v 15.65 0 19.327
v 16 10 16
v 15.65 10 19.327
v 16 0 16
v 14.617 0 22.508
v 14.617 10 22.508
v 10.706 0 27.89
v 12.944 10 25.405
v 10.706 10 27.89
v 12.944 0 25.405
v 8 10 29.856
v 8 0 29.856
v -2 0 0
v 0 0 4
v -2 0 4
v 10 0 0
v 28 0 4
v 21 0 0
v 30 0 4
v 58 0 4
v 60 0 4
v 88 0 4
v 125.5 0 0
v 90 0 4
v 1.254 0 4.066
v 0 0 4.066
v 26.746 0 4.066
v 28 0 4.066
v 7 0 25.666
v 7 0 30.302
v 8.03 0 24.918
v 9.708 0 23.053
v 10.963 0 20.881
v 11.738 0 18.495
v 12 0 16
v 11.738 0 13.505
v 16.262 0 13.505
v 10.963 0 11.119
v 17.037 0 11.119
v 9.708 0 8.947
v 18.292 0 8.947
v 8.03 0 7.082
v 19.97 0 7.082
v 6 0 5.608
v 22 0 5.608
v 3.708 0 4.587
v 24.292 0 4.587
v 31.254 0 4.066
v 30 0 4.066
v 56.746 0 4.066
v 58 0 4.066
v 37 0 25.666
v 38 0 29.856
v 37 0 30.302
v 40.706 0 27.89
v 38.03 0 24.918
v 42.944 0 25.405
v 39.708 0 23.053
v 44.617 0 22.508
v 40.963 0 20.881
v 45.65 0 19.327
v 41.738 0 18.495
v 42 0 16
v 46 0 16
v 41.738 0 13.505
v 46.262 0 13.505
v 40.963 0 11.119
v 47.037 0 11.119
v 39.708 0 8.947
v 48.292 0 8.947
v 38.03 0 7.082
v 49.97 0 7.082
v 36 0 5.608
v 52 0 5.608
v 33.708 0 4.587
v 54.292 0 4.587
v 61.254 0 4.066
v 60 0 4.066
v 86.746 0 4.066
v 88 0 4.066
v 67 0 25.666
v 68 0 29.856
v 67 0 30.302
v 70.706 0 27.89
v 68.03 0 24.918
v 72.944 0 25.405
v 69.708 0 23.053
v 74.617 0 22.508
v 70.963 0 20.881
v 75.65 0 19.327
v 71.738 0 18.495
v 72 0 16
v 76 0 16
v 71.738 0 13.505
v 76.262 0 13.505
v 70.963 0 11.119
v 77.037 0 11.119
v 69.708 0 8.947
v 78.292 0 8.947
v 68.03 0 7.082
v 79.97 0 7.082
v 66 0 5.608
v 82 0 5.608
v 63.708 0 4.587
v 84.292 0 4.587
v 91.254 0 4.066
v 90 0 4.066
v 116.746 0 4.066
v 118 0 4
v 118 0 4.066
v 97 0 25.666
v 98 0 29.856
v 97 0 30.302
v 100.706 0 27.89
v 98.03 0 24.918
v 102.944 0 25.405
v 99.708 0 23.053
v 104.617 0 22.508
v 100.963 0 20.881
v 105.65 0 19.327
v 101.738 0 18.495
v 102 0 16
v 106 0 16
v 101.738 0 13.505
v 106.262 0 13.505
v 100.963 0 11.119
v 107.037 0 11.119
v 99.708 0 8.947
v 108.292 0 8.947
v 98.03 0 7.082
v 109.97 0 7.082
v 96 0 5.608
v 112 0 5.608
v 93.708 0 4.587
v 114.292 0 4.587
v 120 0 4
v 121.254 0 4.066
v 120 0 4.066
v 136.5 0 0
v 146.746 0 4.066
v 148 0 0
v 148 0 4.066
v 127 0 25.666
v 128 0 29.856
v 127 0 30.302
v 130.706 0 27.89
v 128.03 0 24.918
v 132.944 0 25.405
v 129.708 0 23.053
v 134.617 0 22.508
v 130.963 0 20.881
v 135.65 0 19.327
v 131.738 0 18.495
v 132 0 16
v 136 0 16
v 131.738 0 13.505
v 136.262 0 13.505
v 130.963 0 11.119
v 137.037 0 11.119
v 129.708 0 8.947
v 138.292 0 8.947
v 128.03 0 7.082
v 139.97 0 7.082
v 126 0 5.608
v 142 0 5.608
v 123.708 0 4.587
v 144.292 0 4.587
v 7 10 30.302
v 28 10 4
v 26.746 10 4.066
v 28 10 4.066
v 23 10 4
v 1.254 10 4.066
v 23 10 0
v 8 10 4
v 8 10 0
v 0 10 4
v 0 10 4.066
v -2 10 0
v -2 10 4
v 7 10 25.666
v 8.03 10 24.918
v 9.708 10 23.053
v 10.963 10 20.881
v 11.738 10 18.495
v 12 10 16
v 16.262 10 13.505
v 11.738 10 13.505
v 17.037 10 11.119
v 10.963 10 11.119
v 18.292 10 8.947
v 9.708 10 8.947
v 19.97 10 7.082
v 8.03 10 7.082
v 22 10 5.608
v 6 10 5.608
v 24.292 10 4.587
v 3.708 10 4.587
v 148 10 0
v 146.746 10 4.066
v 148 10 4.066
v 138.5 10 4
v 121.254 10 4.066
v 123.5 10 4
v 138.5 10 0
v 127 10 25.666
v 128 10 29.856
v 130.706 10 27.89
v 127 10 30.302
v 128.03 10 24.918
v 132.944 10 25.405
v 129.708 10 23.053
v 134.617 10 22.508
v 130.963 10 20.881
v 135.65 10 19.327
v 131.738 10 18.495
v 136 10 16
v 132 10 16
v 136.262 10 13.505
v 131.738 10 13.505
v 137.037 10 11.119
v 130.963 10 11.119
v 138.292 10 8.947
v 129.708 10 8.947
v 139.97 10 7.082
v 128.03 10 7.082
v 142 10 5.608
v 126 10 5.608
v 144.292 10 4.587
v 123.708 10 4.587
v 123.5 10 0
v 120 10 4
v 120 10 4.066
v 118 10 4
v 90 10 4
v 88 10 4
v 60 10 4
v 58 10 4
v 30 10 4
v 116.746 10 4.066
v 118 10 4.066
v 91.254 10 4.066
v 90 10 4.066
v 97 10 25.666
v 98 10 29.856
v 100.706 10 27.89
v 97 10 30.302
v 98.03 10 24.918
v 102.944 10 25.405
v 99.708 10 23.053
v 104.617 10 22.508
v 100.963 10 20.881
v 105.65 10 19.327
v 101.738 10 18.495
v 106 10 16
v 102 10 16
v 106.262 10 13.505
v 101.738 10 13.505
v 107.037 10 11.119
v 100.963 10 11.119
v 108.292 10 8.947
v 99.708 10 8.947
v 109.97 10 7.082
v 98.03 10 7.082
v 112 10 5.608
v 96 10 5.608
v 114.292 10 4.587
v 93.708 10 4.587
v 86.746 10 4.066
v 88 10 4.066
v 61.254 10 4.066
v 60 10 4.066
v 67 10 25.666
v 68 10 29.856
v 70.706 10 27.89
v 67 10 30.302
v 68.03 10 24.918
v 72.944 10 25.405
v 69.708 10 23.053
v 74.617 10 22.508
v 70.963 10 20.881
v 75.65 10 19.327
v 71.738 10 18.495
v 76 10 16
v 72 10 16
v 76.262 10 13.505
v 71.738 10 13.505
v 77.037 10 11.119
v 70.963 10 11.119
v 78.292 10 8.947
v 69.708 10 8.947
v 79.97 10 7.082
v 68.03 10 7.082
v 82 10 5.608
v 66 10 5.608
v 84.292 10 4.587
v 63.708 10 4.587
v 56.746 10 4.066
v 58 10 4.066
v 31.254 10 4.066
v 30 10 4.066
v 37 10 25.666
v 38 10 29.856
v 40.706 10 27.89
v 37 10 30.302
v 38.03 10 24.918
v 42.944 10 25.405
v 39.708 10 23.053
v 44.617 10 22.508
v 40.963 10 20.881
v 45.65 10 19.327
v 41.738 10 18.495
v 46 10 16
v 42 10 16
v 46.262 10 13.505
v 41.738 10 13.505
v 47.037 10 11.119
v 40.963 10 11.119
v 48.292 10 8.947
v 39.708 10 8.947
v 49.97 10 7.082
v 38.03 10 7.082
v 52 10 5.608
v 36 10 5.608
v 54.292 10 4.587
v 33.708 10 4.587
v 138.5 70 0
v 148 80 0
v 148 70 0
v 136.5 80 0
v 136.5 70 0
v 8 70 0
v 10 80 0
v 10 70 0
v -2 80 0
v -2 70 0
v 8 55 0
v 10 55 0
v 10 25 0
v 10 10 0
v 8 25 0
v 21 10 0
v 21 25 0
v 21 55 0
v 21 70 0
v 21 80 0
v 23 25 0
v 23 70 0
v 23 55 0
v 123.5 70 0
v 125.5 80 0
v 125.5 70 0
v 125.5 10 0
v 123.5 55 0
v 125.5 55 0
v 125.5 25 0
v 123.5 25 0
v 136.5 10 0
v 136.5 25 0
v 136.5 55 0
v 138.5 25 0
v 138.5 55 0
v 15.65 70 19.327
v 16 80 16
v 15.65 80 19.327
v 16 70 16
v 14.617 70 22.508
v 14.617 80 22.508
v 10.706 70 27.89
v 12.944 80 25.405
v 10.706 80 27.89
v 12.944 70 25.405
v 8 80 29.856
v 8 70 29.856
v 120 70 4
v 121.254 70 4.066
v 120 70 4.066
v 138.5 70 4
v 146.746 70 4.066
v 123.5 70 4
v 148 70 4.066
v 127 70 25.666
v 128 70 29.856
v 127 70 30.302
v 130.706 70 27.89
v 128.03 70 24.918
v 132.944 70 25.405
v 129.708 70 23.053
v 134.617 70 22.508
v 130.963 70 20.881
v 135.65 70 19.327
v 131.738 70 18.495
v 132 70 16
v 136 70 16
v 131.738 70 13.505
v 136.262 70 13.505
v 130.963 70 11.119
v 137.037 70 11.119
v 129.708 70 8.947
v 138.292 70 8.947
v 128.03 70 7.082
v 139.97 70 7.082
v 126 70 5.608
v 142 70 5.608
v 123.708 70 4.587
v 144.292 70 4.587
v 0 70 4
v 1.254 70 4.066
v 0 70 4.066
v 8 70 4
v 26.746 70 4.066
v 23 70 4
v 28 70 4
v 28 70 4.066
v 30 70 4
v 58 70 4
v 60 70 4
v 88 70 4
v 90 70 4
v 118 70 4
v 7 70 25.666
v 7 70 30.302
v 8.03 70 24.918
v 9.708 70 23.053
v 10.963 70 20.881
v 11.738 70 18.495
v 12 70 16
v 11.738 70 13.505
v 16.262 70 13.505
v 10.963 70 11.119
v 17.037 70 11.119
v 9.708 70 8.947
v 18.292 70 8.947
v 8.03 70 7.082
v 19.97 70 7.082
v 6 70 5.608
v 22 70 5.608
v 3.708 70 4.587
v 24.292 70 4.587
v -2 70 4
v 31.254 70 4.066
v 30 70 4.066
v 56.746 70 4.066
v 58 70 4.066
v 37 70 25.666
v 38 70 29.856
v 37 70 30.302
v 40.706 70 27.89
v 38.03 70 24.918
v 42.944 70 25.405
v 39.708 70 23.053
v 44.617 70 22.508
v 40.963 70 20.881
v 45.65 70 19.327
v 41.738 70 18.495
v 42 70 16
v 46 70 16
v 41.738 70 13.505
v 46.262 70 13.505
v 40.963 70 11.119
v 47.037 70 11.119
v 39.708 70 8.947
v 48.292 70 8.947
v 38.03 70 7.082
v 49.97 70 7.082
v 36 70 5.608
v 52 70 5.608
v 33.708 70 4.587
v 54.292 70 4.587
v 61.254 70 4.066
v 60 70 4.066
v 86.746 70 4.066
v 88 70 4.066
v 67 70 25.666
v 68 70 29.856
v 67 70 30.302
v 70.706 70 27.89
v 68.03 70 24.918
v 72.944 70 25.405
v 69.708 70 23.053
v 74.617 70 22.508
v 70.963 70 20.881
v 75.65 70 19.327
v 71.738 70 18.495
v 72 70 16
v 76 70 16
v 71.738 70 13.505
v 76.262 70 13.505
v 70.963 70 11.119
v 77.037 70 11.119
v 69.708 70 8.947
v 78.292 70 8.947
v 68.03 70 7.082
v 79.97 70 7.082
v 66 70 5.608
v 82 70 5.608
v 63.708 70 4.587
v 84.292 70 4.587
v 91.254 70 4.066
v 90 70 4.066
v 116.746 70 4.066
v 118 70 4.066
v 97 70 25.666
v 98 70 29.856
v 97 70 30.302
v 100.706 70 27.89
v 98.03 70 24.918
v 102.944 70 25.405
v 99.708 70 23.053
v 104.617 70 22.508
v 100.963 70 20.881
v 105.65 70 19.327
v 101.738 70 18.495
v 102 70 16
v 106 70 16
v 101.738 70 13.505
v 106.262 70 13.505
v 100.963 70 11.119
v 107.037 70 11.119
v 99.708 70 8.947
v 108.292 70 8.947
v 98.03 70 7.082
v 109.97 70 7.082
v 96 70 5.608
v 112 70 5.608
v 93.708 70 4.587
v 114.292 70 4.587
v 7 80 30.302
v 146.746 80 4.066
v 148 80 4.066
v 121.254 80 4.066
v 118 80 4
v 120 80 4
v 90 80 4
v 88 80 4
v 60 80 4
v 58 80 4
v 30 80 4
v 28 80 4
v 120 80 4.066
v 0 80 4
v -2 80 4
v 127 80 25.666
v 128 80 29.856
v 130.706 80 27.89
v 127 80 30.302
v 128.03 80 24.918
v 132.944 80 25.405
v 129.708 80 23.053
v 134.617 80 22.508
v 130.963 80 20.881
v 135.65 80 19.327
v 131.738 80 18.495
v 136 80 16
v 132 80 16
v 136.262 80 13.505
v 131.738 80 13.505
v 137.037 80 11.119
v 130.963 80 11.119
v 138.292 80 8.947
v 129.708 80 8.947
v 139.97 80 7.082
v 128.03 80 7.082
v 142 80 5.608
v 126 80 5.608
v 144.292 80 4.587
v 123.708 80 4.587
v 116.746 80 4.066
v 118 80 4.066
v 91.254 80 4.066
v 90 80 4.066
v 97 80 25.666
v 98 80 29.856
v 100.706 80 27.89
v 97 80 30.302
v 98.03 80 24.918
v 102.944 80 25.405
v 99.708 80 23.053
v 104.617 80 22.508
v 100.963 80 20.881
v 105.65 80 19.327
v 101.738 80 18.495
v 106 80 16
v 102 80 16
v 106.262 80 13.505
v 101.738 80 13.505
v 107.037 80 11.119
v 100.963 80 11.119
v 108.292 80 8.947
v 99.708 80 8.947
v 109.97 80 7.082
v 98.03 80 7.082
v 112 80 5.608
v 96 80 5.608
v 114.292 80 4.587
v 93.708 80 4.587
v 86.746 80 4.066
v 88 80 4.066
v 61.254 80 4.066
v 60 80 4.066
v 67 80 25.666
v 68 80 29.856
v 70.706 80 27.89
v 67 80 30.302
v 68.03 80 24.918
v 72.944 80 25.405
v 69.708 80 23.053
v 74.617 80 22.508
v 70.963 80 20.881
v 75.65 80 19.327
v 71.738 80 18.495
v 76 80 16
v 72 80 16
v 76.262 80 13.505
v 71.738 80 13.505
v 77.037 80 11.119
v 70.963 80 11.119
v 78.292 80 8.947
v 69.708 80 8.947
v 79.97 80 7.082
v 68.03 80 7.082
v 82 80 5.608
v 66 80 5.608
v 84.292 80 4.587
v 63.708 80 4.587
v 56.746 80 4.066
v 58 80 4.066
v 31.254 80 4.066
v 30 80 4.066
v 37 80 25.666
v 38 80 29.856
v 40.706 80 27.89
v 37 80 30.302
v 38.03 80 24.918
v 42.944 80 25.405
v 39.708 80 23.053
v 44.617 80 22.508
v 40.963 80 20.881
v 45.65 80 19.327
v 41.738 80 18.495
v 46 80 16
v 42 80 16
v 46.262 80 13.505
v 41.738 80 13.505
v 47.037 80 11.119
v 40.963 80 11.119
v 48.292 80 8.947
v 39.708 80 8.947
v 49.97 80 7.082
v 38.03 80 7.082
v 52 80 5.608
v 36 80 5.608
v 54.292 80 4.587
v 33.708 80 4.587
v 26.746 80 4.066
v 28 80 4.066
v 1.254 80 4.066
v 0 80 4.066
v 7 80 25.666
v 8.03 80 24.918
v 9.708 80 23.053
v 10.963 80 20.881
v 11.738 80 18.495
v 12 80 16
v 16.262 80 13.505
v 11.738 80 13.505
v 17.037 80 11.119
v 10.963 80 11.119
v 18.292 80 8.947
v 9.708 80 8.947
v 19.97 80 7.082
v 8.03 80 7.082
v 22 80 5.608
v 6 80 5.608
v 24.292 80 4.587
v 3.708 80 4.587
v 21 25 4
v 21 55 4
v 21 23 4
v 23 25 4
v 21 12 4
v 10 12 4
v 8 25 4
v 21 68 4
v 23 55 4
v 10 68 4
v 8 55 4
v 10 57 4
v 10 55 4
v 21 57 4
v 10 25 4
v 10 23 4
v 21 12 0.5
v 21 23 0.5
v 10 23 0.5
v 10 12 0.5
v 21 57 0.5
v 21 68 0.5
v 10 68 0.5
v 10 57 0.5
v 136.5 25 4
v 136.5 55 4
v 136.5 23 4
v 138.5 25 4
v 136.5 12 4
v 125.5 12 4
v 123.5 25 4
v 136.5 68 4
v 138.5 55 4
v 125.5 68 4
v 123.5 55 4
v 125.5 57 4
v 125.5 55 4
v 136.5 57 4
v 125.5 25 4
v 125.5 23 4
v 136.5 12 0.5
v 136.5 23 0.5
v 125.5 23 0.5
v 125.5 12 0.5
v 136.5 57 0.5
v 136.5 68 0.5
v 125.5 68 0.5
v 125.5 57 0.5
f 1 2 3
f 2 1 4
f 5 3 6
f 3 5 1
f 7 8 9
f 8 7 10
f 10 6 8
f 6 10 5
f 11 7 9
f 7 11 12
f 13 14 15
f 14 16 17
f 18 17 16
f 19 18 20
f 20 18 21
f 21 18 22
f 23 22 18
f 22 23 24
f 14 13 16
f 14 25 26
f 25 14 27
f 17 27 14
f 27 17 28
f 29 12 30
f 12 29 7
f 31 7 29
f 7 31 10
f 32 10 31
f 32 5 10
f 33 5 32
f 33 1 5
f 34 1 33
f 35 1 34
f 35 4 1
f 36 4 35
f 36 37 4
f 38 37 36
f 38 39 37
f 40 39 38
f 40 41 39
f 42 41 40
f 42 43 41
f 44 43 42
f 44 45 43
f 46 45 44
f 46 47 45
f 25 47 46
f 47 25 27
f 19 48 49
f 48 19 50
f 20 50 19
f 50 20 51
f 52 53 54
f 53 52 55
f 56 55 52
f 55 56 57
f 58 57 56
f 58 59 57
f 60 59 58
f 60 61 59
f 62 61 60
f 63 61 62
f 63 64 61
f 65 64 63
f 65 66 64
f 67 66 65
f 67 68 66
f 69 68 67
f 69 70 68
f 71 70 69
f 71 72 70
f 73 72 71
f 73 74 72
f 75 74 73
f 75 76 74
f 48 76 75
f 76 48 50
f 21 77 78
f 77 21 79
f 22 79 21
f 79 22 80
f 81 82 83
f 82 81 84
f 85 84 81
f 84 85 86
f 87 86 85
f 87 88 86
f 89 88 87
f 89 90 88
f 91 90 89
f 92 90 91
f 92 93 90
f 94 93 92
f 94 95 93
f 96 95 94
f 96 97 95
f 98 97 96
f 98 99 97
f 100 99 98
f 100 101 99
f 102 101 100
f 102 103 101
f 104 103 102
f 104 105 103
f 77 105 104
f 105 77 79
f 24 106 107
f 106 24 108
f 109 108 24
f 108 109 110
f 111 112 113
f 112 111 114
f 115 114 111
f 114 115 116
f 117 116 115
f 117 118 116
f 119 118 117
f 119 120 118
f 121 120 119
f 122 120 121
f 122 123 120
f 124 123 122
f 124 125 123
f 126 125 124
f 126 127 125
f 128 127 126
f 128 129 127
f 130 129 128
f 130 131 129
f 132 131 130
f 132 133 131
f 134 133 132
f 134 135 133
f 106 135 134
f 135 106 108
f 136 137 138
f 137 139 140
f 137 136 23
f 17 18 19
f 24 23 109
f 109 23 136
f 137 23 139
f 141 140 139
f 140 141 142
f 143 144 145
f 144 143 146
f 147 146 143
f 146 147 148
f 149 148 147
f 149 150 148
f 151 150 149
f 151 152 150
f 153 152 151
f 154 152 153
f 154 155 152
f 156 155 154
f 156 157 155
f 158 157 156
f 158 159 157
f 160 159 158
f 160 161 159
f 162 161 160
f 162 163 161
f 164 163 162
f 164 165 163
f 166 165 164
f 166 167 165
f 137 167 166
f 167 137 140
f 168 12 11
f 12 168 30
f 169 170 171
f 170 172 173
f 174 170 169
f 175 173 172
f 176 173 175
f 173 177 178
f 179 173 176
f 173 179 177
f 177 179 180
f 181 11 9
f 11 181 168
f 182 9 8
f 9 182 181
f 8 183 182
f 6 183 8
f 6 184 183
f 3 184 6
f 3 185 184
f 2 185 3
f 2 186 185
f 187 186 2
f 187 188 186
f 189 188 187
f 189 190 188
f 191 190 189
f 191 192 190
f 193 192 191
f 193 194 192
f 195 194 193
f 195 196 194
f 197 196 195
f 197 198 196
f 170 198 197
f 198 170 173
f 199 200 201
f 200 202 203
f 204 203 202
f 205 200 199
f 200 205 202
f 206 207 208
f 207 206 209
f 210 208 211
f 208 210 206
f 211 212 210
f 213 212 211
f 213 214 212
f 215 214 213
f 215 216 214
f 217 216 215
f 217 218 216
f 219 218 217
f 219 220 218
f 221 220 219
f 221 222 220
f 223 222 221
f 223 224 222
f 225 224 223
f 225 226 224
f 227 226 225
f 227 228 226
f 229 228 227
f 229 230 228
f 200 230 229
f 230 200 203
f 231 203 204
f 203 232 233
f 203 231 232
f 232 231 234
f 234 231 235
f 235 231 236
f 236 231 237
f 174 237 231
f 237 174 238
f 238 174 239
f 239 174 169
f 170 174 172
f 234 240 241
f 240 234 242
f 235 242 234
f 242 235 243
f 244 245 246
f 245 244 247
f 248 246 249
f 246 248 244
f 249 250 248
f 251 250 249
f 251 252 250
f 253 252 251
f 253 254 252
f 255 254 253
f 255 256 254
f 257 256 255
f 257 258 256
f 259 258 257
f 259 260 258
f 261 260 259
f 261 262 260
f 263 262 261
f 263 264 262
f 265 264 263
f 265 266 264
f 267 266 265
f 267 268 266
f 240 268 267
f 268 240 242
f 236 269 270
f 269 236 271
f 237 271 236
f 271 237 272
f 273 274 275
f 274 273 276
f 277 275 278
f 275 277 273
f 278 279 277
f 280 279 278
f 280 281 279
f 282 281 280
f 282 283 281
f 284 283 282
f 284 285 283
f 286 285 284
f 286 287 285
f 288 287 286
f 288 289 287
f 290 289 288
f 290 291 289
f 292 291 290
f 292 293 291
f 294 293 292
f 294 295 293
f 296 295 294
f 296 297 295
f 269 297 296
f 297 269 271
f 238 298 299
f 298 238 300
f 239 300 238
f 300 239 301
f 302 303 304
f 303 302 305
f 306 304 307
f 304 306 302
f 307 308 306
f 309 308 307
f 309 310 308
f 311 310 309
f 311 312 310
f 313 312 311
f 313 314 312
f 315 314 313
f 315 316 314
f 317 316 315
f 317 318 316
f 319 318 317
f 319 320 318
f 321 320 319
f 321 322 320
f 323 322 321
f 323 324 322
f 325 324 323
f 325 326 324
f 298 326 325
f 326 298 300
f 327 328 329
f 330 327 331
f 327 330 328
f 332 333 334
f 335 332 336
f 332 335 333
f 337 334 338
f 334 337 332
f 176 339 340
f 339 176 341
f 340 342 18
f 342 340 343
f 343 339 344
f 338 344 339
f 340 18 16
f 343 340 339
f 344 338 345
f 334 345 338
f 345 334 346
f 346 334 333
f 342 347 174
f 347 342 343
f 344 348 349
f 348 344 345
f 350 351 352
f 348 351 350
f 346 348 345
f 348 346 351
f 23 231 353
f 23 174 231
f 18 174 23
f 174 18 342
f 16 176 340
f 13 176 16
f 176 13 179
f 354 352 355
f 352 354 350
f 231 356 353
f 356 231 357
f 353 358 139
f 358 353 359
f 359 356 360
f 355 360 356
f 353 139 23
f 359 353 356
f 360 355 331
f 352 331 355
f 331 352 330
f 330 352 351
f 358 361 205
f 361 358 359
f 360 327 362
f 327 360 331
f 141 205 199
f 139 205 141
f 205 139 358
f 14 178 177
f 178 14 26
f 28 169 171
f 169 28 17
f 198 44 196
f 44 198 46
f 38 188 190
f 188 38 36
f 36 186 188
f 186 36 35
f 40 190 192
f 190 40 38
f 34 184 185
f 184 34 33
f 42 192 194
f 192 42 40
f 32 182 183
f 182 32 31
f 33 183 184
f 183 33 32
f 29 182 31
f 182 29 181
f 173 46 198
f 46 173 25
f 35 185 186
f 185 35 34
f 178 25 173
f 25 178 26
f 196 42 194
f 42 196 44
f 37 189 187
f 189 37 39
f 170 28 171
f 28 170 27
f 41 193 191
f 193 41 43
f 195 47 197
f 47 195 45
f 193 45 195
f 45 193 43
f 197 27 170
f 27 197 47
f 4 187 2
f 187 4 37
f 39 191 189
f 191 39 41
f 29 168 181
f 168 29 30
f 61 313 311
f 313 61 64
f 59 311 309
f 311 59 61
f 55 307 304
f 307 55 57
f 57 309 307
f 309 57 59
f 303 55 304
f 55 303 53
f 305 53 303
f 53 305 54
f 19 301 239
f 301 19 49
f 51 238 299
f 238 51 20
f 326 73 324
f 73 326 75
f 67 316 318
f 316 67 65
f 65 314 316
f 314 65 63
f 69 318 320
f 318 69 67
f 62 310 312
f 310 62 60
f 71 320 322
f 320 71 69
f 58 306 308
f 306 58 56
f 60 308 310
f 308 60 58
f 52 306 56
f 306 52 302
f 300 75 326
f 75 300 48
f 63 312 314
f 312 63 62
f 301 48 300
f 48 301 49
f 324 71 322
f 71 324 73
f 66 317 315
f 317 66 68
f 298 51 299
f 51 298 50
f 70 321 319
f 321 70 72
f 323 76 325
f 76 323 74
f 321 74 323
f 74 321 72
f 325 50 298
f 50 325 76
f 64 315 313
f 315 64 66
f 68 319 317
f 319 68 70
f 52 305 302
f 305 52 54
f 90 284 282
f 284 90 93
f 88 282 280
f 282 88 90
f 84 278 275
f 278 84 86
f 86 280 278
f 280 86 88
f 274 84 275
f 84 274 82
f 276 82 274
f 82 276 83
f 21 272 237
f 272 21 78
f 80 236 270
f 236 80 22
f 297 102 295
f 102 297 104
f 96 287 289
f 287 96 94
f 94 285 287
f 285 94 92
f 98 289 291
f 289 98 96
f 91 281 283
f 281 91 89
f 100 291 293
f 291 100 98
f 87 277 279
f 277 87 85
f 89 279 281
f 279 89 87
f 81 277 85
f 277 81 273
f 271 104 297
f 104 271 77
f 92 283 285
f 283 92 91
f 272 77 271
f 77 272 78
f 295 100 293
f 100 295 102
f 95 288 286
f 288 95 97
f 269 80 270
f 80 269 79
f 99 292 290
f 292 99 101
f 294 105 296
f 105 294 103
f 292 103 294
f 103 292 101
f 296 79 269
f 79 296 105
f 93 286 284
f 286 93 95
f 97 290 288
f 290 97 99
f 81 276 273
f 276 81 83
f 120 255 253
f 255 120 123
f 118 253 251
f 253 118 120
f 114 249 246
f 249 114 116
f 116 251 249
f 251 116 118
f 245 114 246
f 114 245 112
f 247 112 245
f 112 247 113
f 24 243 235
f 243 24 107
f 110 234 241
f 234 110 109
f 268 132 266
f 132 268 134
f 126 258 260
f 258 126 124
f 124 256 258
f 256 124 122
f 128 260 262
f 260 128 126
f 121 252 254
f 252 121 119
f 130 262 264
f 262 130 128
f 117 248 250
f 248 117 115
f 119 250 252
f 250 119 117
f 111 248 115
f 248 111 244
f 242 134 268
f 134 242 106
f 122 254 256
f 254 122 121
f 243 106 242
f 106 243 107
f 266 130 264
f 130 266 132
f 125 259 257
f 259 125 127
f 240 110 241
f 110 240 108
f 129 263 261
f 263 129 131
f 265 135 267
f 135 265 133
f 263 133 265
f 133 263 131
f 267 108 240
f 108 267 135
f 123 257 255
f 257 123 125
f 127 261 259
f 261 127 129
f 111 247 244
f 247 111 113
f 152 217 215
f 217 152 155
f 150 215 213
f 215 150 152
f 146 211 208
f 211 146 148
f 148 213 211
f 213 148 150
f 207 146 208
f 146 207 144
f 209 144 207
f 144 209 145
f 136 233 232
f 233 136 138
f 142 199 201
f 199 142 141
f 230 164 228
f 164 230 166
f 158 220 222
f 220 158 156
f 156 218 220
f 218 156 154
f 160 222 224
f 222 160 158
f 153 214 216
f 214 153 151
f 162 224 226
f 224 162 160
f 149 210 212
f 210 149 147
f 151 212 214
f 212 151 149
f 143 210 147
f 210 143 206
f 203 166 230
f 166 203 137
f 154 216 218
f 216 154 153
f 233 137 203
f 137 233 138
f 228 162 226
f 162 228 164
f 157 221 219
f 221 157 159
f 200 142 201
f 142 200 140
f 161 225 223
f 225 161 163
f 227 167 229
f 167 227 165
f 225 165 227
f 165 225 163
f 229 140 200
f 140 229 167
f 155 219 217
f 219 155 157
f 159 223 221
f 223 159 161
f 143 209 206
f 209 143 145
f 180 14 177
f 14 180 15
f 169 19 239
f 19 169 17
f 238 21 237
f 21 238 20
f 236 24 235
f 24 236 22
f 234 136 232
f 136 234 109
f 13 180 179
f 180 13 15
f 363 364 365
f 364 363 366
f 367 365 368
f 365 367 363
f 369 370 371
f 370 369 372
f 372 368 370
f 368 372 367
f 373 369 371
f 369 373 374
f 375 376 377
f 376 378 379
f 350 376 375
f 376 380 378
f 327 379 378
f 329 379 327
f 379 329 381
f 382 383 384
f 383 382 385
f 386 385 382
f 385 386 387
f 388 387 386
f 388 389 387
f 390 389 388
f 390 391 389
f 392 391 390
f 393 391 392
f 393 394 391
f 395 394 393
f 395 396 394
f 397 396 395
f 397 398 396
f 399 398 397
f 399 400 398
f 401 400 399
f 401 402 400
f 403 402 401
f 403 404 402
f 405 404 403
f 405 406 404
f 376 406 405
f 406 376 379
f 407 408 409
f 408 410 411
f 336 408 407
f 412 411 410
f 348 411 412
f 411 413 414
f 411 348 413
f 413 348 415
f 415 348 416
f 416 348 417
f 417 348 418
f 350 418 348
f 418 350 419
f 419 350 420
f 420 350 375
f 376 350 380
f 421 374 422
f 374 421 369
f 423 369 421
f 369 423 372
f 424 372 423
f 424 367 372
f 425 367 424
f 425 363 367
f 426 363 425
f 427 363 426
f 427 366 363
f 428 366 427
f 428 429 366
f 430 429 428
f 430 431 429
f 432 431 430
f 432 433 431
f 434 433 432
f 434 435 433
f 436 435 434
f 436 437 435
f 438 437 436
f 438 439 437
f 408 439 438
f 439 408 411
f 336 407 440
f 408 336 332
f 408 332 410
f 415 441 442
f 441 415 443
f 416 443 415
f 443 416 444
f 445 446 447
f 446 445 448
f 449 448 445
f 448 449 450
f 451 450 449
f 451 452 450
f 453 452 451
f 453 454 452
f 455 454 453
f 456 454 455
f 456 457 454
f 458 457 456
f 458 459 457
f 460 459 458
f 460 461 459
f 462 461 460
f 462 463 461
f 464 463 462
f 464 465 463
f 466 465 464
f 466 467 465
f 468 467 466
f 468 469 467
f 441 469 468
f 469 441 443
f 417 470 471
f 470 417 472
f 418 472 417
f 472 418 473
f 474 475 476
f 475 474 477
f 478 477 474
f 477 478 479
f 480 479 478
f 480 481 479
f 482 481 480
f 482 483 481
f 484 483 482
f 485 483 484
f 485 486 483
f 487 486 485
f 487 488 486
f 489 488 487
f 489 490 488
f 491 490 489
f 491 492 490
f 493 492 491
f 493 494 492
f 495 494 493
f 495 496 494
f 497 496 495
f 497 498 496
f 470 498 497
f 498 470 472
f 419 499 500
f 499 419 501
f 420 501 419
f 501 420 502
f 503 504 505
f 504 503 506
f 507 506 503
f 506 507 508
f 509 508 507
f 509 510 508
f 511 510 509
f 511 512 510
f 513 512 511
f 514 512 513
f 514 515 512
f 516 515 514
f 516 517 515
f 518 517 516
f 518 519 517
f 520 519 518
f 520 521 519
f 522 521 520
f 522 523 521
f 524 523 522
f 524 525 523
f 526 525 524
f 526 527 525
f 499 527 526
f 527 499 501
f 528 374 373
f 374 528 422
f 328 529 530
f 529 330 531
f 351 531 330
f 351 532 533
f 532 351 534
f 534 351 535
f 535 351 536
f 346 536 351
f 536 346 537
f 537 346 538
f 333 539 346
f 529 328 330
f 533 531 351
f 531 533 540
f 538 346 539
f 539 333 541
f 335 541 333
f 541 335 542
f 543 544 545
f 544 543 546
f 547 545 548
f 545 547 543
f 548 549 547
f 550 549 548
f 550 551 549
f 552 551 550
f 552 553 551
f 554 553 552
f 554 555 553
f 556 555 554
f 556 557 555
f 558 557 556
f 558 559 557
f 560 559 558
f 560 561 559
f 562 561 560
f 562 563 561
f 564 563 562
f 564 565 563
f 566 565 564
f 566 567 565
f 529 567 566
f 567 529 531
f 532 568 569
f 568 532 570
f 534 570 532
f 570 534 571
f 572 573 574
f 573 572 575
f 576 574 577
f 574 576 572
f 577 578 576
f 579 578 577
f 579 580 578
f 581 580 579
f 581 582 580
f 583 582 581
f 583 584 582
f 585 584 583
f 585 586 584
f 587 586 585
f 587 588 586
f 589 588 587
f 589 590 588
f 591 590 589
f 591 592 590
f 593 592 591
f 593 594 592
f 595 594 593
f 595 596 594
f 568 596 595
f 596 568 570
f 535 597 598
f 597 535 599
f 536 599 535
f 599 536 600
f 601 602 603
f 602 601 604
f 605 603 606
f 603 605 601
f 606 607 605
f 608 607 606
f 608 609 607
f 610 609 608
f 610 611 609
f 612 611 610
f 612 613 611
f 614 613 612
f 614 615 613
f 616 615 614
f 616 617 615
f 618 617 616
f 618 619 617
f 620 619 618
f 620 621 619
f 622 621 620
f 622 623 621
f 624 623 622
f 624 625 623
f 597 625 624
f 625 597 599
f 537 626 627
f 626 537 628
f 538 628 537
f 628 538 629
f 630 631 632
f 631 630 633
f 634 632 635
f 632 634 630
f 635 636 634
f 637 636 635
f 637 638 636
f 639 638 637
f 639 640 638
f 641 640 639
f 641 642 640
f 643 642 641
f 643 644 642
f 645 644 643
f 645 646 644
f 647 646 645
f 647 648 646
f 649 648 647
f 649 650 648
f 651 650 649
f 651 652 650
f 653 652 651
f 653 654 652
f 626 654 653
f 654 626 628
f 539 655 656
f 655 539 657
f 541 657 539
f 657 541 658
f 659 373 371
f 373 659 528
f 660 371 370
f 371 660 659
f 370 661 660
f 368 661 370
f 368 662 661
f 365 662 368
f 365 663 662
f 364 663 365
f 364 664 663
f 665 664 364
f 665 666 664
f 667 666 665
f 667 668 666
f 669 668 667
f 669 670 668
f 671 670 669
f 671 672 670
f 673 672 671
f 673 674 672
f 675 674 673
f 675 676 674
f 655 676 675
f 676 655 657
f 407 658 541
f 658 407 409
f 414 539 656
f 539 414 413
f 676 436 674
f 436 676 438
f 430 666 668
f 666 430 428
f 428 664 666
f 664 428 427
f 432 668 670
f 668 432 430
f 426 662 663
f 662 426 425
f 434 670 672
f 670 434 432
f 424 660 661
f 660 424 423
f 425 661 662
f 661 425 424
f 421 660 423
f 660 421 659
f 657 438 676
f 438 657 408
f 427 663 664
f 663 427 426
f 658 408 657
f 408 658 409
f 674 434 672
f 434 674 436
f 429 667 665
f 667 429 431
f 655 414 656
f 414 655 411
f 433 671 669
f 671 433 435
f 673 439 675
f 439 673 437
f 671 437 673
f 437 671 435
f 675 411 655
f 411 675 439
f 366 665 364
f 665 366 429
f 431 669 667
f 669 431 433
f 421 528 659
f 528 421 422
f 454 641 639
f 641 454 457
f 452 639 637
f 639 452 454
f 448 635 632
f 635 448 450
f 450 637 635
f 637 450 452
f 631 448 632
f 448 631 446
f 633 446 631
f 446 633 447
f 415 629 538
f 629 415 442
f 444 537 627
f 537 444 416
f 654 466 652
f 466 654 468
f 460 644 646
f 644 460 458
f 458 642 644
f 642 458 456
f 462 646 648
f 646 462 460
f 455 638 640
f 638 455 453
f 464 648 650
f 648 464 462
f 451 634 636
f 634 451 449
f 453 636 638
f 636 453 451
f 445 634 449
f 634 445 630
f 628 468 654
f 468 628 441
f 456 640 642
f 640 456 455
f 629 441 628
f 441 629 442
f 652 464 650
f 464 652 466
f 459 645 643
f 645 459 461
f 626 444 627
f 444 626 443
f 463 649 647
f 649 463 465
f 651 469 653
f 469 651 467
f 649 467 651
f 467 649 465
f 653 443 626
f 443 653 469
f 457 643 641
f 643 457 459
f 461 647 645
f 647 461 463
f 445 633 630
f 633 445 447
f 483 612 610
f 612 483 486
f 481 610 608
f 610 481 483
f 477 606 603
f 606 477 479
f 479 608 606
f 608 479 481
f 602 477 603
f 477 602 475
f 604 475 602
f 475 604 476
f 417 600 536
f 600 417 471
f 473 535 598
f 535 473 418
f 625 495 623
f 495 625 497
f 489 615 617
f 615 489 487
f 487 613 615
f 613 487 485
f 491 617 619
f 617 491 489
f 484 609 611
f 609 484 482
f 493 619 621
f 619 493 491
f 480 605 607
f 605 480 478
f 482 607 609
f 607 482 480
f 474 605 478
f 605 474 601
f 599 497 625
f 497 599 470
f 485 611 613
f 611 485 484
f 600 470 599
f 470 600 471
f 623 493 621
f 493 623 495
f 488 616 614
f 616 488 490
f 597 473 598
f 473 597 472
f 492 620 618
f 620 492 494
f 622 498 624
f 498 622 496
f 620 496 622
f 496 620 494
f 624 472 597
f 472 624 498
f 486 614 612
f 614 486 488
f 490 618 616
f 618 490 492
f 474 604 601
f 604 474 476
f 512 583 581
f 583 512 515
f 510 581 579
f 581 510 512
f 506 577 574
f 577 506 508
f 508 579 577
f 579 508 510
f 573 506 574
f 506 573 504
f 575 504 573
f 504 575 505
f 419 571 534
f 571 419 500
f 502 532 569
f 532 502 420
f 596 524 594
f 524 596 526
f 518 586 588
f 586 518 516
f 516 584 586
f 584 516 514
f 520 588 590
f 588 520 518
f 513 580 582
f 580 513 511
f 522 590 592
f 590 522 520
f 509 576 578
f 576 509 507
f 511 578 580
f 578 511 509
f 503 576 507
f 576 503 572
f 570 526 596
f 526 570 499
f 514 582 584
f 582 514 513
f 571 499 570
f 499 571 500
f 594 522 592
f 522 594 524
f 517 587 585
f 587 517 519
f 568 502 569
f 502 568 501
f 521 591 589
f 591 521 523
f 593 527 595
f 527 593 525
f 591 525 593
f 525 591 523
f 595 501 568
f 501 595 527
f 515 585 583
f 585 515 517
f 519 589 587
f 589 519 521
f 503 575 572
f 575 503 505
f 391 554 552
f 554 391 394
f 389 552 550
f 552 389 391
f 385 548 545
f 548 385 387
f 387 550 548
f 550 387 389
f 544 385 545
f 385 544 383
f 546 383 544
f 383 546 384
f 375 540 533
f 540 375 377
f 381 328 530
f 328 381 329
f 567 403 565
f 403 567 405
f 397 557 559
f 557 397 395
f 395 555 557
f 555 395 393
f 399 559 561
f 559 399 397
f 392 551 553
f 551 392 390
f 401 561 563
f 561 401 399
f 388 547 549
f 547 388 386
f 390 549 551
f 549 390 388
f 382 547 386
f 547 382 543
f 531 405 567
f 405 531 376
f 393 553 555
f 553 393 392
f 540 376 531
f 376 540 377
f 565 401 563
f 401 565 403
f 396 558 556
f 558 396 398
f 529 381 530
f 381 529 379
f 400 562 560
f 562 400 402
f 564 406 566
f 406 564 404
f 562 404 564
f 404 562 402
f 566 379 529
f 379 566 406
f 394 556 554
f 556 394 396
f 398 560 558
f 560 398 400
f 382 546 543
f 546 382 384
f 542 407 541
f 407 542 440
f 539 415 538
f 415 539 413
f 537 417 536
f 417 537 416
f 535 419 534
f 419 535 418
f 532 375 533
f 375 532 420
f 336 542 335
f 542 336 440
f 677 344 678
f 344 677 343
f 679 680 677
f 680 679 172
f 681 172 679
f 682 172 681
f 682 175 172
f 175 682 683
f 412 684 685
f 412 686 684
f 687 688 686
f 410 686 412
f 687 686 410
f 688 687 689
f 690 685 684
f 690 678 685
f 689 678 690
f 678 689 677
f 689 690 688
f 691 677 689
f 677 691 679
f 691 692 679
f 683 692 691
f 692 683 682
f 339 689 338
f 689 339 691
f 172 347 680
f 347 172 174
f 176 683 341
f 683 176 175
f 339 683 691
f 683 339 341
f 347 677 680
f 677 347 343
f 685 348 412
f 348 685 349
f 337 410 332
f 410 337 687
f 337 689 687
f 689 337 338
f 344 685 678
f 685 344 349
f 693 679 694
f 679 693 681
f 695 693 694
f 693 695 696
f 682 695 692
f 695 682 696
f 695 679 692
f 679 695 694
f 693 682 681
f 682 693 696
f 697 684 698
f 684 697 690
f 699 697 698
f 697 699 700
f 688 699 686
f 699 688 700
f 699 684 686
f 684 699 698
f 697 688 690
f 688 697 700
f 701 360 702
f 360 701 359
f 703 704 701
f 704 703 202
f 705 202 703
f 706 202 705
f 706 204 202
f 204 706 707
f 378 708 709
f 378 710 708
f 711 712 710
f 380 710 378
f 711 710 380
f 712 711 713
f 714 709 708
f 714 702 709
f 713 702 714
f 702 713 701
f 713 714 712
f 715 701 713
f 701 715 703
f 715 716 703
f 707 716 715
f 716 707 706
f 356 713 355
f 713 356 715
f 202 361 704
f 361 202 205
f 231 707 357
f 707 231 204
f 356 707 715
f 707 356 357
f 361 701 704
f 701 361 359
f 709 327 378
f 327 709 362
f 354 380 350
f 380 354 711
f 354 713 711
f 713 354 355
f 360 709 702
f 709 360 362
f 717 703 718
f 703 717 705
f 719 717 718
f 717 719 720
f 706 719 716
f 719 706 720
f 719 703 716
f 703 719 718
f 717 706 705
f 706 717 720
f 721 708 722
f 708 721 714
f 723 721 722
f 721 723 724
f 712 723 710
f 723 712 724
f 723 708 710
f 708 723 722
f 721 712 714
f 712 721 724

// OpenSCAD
// form for magnets: "none", "circle", "square"
slot_shape = "square";
slot_size = 11;

hooks_amount = 5;
hook_size = 12;
hook_width = 4;
hook_cutoff = 7;
hook_distance = 30;
hook_thickness = 10;
hook_base_height = 4;

support_length = 60;
support_width = slot_size;
support_height = 4;


frame();

module frame() {
    // hooks
    translate([0, 0, 0]) row();
    translate([0, support_length + hook_thickness, 0]) row();
    
    // horizontal bars
    support(10);
    y_slot_shift = hook_distance * (hooks_amount - 1) + support_width/2;
    support(y_slot_shift);
}


module row(){
    difference(){
        union(){
            for (i = [0 : hooks_amount-1]) {
                translate([i * hook_distance, 0, hook_base_height - hook_width]) hook();
            }
            translate([-2, 0, 0]) cube([hook_distance * hooks_amount, hook_thickness, hook_base_height]);
        }
        translate([-5, -5, -10]) cube([hook_distance * hooks_amount + 10, 2*hook_thickness, 10]);
    }
}

module hook() {
    hook_var = hook_size + hook_width;
    difference(){
        union(){
            translate([0, 0, hook_var]) rotate([-90, 0, 0]) cylinder(h = hook_thickness, r1 = hook_var, r2 = hook_var);
            cube([hook_var, hook_thickness, hook_var]);
            translate([hook_var, 0, 0]) cube([hook_size, hook_thickness, hook_var]);
        }
        union(){
            translate([0, -5, hook_var]) rotate([-90, 0, 0]) cylinder(h = hook_thickness * 2, r1 = hook_size, r2 = hook_size);
            translate([2*hook_size + hook_width, - 5, hook_var]) rotate([-90, 0, 0]) cylinder(h = hook_thickness * 2, r1 = hook_size, r2 = hook_size);
            translate([-2*(hook_var), -5, 0]) cube([2*(hook_var), hook_thickness * 2, 2*(hook_var)]);
            translate([-2*(hook_var) + hook_cutoff, -5, hook_var]) cube([2*(hook_var), hook_thickness * 2, 2*(hook_var)]);
        }
    }
}

module support(x_position) {
    slot_base_size = slot_size + 4;
    difference() {
        union() {
            translate([x_position, 0, 0]) cube([support_width, 2*hook_thickness + support_length, support_height]);
            // magnet slot bases
            translate([x_position + support_width/2, hook_thickness + slot_base_size/2, support_height/2]) centered_shape(slot_base_size);
            translate([x_position + support_width/2, hook_thickness + support_length - slot_base_size/2, support_height/2]) centered_shape(slot_base_size);
        }
        union() {
            // magnet slots 
            translate([x_position + support_width/2, hook_thickness + slot_base_size/2, support_height/2 + 0.5]) centered_shape(slot_size);
            translate([x_position + support_width/2, hook_thickness + support_length - slot_base_size/2, support_height/2 + 0.5]) centered_shape(slot_size);
        }
    }        

    module centered_shape(shape_size=slot_size) {
        if(slot_shape == "circle") {
            cylinder(h = support_height, d = shape_size, center = true);
        }
        else{
            if(slot_shape == "square") {
                cube([shape_size, shape_size, support_height], center = true);
            }
        }
    }
}
